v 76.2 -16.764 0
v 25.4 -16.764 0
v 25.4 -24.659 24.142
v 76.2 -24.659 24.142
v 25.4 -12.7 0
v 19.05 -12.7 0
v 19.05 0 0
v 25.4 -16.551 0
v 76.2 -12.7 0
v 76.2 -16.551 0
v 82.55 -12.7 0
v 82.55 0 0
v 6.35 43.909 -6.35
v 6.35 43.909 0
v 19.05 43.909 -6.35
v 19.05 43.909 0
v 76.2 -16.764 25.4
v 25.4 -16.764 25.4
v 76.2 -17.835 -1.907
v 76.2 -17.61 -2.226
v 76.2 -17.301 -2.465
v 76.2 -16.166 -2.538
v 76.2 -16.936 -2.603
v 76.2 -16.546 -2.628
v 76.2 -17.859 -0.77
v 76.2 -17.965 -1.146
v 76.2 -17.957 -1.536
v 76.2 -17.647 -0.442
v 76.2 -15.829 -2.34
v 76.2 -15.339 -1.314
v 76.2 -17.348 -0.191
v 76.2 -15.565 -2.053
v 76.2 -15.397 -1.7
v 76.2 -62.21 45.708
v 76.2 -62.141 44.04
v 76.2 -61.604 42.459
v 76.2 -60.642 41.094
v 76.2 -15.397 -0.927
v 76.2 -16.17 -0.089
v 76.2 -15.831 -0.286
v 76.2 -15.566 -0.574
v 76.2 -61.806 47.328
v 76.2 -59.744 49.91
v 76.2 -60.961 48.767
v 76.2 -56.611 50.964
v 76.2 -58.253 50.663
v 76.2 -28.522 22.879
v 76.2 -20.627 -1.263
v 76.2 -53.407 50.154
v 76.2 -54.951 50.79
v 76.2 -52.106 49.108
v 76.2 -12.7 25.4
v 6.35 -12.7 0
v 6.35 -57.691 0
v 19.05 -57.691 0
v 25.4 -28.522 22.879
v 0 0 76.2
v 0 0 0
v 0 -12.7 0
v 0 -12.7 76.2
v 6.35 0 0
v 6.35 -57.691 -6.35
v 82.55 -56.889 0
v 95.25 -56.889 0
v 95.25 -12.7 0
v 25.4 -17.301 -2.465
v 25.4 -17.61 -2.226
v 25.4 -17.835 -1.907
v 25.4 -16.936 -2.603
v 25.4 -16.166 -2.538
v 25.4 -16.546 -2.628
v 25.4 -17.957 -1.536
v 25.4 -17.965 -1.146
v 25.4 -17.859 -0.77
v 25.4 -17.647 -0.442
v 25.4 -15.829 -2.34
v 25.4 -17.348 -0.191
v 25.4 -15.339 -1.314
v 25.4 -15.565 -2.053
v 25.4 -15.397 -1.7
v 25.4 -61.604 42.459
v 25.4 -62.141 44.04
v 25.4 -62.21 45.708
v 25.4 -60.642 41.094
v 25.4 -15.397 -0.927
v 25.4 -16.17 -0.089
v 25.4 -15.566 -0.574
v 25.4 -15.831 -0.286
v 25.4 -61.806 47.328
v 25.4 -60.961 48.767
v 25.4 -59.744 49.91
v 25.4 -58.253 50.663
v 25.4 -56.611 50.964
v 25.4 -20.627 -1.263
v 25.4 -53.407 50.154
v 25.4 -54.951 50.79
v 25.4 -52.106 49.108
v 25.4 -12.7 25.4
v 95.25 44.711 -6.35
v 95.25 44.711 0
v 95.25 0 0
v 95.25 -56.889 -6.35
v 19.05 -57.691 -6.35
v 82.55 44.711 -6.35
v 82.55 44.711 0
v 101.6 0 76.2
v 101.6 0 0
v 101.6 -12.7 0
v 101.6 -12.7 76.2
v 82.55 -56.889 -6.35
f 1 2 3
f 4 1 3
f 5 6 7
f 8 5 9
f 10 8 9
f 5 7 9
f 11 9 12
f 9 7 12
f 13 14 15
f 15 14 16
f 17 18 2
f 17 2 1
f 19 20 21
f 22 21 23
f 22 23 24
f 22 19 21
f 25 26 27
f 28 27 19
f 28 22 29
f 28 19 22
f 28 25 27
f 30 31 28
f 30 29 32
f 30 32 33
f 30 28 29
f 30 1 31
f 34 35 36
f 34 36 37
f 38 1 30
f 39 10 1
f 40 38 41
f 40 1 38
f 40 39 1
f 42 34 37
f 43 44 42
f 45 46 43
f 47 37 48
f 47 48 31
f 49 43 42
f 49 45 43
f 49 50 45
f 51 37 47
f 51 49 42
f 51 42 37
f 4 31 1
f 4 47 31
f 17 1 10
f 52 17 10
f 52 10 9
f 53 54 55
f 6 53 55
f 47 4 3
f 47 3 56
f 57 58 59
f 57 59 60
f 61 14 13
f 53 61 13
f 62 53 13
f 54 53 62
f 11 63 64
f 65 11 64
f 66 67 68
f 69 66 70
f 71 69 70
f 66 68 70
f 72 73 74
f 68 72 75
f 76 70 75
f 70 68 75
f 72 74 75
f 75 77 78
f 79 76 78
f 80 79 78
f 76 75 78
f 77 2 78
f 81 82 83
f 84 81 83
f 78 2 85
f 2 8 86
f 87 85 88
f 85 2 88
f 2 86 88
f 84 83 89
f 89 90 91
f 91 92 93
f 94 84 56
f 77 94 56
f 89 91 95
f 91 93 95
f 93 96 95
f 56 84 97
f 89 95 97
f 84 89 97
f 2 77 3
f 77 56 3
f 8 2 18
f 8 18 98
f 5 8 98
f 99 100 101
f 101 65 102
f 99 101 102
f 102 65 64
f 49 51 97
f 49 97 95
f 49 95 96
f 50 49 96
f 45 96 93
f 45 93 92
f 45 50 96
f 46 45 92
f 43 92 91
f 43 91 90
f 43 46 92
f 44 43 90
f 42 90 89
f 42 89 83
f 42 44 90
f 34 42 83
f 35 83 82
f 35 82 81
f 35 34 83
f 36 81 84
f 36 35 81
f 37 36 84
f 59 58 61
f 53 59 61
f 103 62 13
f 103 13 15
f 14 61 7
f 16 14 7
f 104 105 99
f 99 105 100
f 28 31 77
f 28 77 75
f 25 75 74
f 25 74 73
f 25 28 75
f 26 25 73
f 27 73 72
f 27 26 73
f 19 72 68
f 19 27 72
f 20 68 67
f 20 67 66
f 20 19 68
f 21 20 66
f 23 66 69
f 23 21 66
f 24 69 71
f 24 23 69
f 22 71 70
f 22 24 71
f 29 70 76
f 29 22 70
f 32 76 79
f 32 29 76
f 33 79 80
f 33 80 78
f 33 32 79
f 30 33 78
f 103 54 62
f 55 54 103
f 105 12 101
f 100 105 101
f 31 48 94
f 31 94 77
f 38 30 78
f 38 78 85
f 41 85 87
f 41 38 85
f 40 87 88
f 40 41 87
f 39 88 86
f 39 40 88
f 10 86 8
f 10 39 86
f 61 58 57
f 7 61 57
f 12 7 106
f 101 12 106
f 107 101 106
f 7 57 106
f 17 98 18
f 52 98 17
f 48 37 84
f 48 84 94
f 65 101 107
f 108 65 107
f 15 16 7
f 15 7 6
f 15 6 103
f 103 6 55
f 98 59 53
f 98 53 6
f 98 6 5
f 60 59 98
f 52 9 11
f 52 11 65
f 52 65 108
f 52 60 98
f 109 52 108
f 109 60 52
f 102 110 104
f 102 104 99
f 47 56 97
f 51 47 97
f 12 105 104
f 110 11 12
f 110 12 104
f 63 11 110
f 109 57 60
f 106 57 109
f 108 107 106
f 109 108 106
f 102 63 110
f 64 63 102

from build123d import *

# Parameters (mm, degrees)
F0_W      = 101.6
F0_H      = 76.2
F1_DEPTH  = 12.7
F2_W      = 50.8
F2_H      = 25.4
F3_DEPTH  = 4.064
F5_DEPTH  = 50.8
F7_DEPTH  = 50.8
F9_DEPTH  = 50.8
F10_W     = 12.7
F10_H     = 101.6
F11_DEPTH = 6.35
F12_W     = 12.7
F12_H     = 101.6
F13_DEPTH = 6.35


with BuildPart() as f1:
    # F0 (on Front) → F1 (new body)
    with BuildSketch(Plane.XZ):
        with Locations((50.8, 38.1)):
            Rectangle(F0_W, F0_H)
    extrude(amount=F1_DEPTH)

    # F2 (on face) → F3 (join)
    with BuildSketch(Plane.XZ.offset(12.7)):
        with Locations((50.8, 12.7)):
            Rectangle(F2_W, F2_H)
    extrude(amount=F3_DEPTH)

    # F4 (on face) → F5 (join)
    with BuildSketch(Plane.YZ.offset(76.2)):
        Polygon((-20.6267049946, -1.2631730384), (-16.764, 0), (-24.6588314903, 24.1419062159), (-28.5215364849, 22.8787331775), align=None)
    extrude(amount=-F5_DEPTH)

    # F6 (on face) → F7 (join)
    with BuildSketch(Plane.YZ.offset(76.2)):
        with BuildLine():
            Line((-16.5507770221, 0), (-16.764, 0))
            ThreePointArc((-16.764, 0), (-17.5513062441, -2.2836680049), (-15.3387688414, -1.31430279))
            ThreePointArc((-15.3387688414, -1.31430279), (-15.6880232962, -0.4203850569), (-16.5507770221, 0))
        make_face()
        with BuildLine():
            ThreePointArc((-16.5507770221, 0), (-16.6573885111, 0.0043168797), (-16.764, 0))
            Line((-16.764, 0), (-16.5507770221, 0))
        make_face()
    extrude(amount=-F7_DEPTH)

    # F8 (on face) → F9 (join)
    with BuildSketch(Plane.YZ.offset(76.2)):
        with BuildLine():
            Line((-20.6267049946, -1.2631730384), (-28.5215364849, 22.8787331775))
            Line((-28.5215364849, 22.8787331775), (-52.1061010659, 49.1076633334))
            ThreePointArc((-52.1061010659, 49.1076633334), (-60.3932888084, 49.3824101727), (-60.6419928372, 41.0943999887))
            Line((-60.6419928372, 41.0943999887), (-20.6267049946, -1.2631730384))
        make_face()
    extrude(amount=-F9_DEPTH)

    # F10 (on face) → F11 (join)
    with BuildSketch(Plane(origin=(0, 0, 0), x_dir=(1, 0, 0), z_dir=(0, 0, -1))):
        with Locations((88.9, 6.0887979344)):
            Rectangle(F10_W, F10_H)
    extrude(amount=F11_DEPTH)

    # F12 (on face) → F13 (join)
    with BuildSketch(Plane(origin=(0, 0, 0), x_dir=(1, 0, 0), z_dir=(0, 0, -1))):
        with Locations((12.7, 6.8910890259)):
            Rectangle(F12_W, F12_H)
    extrude(amount=F13_DEPTH)


solid = f1.part
